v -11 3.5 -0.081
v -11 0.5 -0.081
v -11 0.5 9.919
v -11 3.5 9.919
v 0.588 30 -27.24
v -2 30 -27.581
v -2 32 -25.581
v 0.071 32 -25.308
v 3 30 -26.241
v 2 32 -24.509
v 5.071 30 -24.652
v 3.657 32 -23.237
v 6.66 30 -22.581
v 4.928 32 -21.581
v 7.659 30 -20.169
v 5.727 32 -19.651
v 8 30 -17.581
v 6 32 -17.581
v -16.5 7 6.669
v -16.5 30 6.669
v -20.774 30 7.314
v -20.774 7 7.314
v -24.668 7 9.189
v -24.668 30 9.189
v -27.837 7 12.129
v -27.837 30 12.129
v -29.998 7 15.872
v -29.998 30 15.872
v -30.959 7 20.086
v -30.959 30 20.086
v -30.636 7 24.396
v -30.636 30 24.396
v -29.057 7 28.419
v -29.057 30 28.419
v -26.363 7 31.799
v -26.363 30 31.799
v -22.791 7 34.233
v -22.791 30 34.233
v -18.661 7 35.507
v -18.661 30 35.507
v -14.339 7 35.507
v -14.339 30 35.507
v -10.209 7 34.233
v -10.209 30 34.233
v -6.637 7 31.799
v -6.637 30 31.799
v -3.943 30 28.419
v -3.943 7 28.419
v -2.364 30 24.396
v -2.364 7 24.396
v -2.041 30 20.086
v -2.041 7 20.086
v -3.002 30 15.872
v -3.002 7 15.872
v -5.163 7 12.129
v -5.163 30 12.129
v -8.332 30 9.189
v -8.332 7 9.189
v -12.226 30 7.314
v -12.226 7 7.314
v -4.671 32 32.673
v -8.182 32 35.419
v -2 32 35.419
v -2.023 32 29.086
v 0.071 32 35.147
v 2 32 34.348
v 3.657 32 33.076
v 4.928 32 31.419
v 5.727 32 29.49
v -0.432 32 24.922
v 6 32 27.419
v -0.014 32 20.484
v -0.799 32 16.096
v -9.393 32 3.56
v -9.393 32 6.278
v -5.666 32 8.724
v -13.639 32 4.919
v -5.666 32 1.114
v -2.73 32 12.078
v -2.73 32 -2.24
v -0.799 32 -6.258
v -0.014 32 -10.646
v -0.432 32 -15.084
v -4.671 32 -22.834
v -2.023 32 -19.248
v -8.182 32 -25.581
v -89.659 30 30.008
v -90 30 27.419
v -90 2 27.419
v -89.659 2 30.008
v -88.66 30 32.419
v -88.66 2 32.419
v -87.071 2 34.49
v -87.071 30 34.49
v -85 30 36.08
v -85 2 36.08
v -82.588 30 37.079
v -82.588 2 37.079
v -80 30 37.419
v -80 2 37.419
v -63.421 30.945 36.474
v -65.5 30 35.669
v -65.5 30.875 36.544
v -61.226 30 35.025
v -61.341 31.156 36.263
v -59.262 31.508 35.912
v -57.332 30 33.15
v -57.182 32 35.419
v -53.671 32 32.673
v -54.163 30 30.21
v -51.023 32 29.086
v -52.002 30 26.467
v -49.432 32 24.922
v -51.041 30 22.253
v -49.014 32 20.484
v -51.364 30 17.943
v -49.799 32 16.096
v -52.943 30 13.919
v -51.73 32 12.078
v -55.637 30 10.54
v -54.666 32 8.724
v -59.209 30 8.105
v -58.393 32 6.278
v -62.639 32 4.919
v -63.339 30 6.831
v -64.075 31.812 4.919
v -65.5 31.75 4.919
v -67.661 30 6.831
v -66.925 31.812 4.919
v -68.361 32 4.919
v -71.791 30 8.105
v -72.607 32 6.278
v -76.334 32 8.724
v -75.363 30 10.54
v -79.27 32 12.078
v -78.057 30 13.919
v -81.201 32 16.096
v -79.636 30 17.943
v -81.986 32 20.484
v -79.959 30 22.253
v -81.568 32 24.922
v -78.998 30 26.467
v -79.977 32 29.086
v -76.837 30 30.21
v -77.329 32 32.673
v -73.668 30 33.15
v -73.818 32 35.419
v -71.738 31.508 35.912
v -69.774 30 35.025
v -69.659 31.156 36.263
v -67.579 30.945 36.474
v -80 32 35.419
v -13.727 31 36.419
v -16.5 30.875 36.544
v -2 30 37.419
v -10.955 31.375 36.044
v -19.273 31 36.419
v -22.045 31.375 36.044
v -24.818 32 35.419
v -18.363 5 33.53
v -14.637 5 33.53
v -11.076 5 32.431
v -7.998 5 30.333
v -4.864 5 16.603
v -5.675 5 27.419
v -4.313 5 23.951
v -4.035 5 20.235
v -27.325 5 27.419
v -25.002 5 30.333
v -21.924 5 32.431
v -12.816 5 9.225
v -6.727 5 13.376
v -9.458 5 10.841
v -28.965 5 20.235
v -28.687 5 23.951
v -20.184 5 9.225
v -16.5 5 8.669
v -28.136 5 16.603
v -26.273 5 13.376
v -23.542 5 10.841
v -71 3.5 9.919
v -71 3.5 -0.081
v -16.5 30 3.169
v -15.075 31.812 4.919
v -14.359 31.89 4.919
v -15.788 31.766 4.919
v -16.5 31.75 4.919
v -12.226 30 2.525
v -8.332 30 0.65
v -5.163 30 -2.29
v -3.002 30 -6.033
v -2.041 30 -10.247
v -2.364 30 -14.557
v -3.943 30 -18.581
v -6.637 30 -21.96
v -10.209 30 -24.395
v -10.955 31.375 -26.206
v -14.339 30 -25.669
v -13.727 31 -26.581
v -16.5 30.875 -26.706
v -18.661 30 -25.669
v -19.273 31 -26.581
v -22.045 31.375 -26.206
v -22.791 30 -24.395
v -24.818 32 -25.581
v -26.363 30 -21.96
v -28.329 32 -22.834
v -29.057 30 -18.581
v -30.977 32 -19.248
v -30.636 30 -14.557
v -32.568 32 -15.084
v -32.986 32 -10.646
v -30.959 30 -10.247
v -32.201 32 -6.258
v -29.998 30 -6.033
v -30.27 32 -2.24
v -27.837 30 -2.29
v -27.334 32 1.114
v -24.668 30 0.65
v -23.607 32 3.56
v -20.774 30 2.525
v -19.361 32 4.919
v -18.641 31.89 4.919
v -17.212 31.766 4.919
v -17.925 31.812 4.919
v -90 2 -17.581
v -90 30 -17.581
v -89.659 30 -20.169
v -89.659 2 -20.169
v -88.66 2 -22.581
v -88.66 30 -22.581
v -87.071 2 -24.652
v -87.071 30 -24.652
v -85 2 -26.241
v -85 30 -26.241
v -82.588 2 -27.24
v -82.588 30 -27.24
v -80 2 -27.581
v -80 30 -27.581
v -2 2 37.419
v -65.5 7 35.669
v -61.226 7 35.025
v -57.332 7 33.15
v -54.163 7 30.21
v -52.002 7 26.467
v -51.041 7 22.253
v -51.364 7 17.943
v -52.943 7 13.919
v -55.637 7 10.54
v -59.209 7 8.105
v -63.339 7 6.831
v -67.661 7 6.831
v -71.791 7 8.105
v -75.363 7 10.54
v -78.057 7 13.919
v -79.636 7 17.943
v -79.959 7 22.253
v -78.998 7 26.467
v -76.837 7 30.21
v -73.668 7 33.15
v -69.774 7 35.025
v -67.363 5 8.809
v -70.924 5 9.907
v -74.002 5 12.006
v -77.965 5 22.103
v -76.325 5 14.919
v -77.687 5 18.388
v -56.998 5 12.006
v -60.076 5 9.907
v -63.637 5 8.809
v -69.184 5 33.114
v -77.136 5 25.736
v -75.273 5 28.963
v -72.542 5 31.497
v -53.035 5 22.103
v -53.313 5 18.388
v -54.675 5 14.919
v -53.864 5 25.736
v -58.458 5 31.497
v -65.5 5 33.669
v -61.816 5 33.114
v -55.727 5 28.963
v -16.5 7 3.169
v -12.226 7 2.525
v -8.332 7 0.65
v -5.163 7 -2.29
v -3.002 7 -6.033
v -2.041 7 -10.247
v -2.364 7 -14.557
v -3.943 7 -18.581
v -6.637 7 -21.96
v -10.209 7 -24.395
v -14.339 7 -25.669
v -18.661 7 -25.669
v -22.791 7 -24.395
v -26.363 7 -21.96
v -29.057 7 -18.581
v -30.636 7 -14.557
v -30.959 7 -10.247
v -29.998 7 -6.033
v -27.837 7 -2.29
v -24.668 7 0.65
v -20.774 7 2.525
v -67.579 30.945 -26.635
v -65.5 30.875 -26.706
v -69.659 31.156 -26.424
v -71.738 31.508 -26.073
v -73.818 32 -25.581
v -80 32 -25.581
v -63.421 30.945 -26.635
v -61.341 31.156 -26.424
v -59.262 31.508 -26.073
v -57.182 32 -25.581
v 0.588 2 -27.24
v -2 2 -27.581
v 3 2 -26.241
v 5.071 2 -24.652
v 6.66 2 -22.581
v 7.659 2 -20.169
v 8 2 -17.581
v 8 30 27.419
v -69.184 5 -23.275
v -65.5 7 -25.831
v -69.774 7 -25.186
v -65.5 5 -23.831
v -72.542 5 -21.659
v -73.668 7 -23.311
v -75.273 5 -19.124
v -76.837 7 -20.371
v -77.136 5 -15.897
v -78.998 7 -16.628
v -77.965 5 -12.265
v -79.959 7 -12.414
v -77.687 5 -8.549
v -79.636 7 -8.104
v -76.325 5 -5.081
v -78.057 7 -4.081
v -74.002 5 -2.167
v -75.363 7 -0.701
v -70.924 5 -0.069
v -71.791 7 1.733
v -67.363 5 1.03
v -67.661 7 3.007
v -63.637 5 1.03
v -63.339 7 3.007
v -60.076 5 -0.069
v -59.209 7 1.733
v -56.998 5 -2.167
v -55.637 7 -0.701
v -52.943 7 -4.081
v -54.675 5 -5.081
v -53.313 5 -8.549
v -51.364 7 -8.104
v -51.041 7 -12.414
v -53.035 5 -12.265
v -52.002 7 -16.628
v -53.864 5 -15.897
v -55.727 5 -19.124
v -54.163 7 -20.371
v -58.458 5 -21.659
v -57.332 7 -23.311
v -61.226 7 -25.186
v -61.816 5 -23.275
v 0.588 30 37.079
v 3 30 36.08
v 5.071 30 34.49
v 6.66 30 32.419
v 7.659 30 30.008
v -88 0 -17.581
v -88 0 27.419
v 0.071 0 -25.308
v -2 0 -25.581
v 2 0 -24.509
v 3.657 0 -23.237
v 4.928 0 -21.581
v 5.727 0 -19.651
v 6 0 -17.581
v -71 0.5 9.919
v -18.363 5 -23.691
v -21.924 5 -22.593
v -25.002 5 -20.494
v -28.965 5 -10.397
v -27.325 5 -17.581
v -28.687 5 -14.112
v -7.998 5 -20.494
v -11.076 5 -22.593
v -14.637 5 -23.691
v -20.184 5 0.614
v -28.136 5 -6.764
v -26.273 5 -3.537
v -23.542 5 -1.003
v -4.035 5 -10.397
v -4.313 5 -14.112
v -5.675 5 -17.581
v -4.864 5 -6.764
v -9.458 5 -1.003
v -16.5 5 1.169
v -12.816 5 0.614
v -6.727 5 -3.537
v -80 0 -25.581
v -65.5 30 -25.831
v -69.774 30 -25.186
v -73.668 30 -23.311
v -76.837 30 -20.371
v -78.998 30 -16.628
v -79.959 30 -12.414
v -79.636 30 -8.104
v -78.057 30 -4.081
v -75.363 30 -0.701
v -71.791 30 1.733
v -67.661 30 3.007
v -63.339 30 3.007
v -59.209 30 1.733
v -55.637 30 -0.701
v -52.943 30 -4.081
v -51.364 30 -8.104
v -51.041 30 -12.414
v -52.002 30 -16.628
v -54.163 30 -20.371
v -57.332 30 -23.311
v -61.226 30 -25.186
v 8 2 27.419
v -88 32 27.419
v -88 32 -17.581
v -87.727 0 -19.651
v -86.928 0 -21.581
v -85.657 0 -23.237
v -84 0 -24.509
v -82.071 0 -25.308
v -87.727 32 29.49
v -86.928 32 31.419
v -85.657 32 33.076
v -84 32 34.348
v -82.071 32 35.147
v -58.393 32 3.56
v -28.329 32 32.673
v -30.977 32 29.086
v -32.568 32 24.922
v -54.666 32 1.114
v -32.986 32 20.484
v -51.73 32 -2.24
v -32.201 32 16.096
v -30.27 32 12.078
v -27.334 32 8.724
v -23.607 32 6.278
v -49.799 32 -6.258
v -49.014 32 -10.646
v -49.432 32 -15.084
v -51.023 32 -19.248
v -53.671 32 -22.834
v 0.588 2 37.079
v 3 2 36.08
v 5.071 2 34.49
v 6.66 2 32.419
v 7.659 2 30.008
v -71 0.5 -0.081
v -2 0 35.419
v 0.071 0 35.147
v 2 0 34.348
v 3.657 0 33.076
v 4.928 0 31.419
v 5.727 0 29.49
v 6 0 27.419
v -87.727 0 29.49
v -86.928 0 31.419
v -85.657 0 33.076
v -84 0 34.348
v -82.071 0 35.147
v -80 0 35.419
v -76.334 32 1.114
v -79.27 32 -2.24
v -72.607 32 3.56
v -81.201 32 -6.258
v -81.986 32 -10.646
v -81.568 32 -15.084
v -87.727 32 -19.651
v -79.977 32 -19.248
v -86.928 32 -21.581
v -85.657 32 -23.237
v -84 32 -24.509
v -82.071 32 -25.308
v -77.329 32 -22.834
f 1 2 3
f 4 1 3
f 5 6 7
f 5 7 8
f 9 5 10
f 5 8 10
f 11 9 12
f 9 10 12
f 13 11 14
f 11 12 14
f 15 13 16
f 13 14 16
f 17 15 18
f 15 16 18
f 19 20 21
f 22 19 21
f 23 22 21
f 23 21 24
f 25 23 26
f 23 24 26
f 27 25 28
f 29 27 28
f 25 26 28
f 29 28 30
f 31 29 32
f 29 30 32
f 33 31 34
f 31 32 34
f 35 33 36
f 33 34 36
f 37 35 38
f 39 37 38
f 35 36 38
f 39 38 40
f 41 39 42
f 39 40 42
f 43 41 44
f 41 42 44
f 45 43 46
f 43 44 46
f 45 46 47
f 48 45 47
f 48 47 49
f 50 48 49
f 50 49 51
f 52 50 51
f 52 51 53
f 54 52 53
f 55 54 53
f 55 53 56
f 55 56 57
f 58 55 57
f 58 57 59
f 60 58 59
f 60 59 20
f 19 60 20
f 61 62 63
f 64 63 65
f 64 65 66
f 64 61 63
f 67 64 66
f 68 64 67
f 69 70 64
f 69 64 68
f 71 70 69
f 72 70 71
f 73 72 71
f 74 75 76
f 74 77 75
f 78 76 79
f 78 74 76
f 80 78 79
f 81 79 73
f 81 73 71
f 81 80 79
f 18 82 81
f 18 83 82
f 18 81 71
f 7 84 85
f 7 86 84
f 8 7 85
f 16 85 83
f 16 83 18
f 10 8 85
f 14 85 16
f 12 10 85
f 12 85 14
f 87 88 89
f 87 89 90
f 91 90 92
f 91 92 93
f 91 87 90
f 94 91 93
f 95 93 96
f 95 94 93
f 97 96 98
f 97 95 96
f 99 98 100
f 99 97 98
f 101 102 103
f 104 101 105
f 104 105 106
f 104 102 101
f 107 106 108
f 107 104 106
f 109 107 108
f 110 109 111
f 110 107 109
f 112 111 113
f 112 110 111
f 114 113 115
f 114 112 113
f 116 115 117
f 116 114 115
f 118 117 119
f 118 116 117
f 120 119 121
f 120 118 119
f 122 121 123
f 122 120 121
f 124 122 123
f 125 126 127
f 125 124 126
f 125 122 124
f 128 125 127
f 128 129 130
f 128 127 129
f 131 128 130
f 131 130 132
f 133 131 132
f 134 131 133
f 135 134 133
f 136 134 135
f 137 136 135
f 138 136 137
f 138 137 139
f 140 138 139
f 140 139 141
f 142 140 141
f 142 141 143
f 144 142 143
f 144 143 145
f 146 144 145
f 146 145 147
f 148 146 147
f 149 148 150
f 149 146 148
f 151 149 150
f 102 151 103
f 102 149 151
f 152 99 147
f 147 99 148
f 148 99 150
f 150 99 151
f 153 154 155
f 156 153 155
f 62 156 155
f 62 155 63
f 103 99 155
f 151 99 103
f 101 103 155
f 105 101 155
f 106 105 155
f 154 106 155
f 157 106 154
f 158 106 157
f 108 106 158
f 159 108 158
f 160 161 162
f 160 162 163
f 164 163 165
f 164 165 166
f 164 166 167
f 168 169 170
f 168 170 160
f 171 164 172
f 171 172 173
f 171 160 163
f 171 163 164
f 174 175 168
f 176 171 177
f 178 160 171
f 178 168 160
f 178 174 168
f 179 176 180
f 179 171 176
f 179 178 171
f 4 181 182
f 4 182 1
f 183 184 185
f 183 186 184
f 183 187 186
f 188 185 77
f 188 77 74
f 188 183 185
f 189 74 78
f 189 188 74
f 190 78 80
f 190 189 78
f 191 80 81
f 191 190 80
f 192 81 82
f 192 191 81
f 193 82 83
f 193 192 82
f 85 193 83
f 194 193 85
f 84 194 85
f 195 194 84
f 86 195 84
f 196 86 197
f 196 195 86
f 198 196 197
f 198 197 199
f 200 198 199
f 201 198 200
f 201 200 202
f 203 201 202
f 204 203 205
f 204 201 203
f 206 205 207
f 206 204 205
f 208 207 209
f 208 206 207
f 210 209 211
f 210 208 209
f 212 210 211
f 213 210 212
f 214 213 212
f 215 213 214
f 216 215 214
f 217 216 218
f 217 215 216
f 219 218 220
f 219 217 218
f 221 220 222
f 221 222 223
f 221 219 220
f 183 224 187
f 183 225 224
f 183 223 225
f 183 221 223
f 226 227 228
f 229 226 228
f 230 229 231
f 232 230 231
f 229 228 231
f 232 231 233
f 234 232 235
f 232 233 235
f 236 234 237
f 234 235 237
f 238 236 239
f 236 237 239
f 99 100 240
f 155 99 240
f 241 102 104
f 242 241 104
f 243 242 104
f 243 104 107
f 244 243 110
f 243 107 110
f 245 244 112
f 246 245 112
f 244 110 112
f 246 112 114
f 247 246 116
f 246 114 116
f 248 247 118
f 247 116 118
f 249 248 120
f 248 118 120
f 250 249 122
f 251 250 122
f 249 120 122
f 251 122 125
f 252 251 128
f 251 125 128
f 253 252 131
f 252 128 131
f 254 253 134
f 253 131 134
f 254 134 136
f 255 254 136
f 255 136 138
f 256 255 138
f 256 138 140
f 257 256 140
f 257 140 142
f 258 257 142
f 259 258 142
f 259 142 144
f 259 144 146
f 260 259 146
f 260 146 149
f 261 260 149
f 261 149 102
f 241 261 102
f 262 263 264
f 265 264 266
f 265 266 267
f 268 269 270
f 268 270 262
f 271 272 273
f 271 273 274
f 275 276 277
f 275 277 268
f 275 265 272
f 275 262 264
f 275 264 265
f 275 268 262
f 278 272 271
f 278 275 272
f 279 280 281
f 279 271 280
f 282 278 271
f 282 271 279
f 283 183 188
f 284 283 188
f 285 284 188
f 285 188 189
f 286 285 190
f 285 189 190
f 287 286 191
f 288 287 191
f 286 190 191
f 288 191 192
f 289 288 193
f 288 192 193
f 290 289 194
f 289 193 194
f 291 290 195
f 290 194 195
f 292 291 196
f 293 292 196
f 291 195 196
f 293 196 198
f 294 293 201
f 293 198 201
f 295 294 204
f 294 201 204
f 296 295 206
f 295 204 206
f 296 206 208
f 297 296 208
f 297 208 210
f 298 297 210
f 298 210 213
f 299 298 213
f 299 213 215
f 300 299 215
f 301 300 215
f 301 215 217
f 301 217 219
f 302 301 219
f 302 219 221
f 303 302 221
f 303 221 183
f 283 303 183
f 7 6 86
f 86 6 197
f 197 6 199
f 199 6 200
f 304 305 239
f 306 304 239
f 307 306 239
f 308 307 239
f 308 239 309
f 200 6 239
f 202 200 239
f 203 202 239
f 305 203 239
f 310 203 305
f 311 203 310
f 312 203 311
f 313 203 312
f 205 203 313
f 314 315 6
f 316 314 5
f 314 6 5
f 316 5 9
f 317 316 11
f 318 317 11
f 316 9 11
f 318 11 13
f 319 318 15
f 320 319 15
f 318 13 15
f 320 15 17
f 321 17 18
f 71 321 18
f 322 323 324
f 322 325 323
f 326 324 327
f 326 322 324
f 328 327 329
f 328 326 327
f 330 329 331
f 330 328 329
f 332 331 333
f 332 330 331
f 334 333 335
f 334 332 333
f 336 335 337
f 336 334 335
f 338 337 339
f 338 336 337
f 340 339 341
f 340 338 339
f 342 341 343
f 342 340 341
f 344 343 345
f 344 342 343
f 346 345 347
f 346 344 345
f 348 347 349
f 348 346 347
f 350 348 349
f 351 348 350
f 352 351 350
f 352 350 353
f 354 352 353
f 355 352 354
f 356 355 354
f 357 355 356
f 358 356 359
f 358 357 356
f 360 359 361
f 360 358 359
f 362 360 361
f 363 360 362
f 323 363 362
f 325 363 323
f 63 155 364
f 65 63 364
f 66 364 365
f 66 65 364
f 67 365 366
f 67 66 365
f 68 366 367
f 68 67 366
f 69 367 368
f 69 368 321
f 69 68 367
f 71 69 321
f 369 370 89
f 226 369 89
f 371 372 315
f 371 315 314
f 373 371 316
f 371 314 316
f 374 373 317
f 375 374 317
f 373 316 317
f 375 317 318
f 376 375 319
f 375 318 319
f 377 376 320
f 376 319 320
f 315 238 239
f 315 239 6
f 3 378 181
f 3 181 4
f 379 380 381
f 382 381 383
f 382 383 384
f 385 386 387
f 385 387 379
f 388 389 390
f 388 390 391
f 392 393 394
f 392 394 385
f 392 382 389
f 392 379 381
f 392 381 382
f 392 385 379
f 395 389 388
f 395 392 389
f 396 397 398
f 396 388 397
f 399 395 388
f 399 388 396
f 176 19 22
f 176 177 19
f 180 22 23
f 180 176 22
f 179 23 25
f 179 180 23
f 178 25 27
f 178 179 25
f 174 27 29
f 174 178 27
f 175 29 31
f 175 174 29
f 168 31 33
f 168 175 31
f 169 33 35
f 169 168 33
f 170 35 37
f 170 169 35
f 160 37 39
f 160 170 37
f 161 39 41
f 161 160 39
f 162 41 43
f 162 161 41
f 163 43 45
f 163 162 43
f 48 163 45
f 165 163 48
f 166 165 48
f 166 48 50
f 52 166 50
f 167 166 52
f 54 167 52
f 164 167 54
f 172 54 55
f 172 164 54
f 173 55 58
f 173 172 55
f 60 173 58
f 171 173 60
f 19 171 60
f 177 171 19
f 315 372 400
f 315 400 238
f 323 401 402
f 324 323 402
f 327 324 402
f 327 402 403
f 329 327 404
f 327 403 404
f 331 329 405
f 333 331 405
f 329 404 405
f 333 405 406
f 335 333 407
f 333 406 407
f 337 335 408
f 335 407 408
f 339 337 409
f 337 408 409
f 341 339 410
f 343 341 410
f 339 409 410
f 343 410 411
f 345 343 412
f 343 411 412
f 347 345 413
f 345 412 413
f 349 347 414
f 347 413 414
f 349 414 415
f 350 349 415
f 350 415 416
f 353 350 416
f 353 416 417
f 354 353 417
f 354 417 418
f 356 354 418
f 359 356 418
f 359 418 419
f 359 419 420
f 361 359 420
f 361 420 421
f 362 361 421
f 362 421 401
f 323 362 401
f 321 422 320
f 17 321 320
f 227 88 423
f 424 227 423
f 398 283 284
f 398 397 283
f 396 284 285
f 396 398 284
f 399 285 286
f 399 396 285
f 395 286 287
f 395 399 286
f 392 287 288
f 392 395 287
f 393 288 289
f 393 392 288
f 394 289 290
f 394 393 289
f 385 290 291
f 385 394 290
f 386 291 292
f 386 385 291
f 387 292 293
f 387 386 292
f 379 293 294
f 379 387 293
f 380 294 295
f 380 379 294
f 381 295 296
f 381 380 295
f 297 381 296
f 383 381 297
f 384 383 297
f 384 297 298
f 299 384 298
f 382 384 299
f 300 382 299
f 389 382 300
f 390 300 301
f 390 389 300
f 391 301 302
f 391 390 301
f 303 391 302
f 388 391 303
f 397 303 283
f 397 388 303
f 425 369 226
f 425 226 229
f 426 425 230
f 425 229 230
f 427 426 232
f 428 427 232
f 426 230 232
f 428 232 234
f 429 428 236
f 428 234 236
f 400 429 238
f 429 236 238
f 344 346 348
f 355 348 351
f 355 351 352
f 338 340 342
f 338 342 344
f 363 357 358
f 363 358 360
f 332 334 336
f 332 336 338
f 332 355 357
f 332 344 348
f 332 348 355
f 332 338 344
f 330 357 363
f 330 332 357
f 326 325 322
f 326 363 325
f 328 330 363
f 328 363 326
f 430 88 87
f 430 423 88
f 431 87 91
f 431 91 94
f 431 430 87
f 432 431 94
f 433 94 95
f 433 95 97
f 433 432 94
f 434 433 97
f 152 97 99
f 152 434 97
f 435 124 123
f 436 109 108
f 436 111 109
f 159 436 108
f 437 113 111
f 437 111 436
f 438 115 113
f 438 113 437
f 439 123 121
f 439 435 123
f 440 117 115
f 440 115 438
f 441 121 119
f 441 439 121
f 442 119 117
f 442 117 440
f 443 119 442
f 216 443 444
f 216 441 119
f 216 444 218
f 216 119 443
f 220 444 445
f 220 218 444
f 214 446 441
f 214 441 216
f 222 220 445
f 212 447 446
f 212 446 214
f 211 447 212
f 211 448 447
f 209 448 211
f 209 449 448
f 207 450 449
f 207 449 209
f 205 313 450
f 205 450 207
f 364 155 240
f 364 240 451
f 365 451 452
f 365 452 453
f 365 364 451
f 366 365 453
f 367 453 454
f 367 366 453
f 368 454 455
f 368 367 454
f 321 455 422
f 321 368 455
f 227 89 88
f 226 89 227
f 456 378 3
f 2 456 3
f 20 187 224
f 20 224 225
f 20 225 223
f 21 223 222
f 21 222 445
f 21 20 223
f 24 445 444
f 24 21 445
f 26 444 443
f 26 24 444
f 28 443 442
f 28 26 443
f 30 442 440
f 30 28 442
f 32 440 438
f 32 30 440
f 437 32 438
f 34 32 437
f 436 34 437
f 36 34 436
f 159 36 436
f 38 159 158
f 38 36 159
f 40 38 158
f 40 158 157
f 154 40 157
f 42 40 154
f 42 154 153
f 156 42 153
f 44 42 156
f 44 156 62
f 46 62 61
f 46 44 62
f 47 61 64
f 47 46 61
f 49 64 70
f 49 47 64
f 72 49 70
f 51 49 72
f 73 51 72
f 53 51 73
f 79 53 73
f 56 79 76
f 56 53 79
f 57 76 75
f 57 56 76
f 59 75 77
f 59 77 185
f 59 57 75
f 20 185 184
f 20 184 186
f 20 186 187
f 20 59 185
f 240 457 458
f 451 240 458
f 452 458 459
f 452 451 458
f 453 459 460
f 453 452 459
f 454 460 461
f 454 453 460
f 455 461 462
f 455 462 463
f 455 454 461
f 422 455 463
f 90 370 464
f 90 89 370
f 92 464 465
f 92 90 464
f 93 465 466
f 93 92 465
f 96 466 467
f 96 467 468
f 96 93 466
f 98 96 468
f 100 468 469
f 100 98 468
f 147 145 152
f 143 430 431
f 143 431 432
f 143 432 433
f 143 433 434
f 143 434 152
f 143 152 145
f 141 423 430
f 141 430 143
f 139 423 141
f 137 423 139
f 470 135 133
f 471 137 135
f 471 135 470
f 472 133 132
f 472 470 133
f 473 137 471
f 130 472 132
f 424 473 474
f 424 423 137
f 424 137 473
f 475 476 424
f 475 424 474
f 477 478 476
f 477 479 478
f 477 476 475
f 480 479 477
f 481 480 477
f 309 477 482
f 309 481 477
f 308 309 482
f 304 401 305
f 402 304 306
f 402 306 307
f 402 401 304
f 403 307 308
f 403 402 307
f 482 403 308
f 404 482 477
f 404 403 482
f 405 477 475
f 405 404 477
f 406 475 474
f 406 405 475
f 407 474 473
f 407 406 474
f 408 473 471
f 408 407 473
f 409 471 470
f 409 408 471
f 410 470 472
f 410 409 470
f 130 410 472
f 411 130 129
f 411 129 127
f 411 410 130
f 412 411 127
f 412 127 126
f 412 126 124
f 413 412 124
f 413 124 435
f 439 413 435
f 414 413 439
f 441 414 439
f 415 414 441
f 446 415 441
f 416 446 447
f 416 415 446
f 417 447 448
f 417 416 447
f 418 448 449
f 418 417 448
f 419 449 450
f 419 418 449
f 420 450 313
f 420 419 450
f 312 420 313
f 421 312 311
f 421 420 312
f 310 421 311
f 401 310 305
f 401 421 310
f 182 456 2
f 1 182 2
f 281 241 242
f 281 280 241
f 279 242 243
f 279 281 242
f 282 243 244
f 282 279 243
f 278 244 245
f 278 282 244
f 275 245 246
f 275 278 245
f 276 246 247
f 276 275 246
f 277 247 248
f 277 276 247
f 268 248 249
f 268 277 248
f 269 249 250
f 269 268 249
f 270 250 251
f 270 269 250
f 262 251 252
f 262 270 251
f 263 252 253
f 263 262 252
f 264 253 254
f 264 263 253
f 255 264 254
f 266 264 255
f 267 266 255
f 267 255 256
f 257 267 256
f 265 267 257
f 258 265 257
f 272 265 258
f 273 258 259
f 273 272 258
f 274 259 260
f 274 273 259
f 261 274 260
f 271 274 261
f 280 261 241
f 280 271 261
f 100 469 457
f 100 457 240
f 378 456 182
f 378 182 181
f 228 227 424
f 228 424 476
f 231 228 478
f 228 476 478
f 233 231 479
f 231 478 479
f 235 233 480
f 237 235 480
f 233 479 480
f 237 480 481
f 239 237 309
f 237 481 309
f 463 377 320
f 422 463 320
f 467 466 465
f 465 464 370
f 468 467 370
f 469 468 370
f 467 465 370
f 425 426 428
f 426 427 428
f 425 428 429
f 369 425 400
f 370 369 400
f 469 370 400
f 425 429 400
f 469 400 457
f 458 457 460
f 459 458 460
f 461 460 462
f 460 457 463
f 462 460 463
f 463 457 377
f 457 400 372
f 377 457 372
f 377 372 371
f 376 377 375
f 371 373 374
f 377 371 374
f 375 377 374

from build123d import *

# Parameters (mm, degrees)
SKETCH1_W           = 98
SKETCH1_H           = 65
BOSS_EXTRUDE1_DEPTH = 32
SKETCH2_R           = 14.5
CUT_EXTRUDE1_DEPTH  = 27
FILLET1_R           = 10
FILLET2_R           = 10
FILLET3_R           = 10
FILLET4_R           = 10
CHAMFER1_SIZE       = 2
CUT_EXTRUDE2_START  = -0.5
SKETCH3_W           = 60
SKETCH3_H           = 10
CUT_EXTRUDE2_DEPTH  = 3


with BuildPart() as part:
    # Sketch1 → Boss-Extrude1 (new body)
    with BuildSketch(Plane(origin=(0, 0, 0), x_dir=(1, 0, 0), z_dir=(0, 1, 0))):
        with Locations((-41, -4.919354839)):
            Rectangle(SKETCH1_W, SKETCH1_H)
    extrude(amount=BOSS_EXTRUDE1_DEPTH)

    # Sketch2 → Cut-Extrude1 (cut)
    with BuildSketch(Plane(origin=(0, 32, 0), x_dir=(1, 0, 0), z_dir=(0, 1, 0))):
        with Locations(Location((-16.5, 11.330645161, 0), (0, 0, 270))):
            Circle(SKETCH2_R)
        with Locations(Location((-16.5, -21.169354839, 0), (0, 0, 90))):
            Circle(SKETCH2_R)
        with Locations(Location((-65.5, 11.330645161, 0), (0, 0, 90))):
            Circle(SKETCH2_R)
        with Locations(Location((-65.5, -21.169354839, 0), (0, 0, 270))):
            Circle(SKETCH2_R)
    extrude(amount=-CUT_EXTRUDE1_DEPTH, mode=Mode.SUBTRACT)

    # Fillet1
    fillet1_edges = [part.edges().sort_by_distance(p)[0] for p in [
        (8, 16, -27.580645161),
    ]]
    fillet(fillet1_edges, radius=FILLET1_R)

    # Fillet2
    fillet2_edges = [part.edges().sort_by_distance(p)[0] for p in [
        (-90, 16, 37.419354839),
    ]]
    fillet(fillet2_edges, radius=FILLET2_R)

    # Fillet3
    fillet3_edges = [part.edges().sort_by_distance(p)[0] for p in [
        (-90, 16, -27.580645161),
    ]]
    fillet(fillet3_edges, radius=FILLET3_R)

    # Fillet4
    fillet4_edges = [part.edges().sort_by_distance(p)[0] for p in [
        (8, 16, 37.419354839),
    ]]
    fillet(fillet4_edges, radius=FILLET4_R)

    # Chamfer1
    # the kernel refuses this chamfer: 2 mm, written as the material it adds along each edge
    with BuildSketch(Plane(origin=(-16.5, 5, 21.169354839), x_dir=(0, 0, -1), z_dir=(1, 0, 0))) as chamfer1_piece_1:
        Polygon((14.5, CHAMFER1_SIZE), (14.5 - CHAMFER1_SIZE, 0), (14.5, 0), align=None)
    revolve(axis=Axis((-16.5, 5, 21.169354839), (0, 1, 0)))
    with BuildSketch(Plane(origin=(-65.5, 5, -11.330645161), x_dir=(0, 0, -1), z_dir=(1, 0, 0))) as chamfer1_piece_2:
        Polygon((14.5, CHAMFER1_SIZE), (14.5 - CHAMFER1_SIZE, 0), (14.5, 0), align=None)
    revolve(axis=Axis((-65.5, 5, -11.330645161), (0, 1, 0)))
    with BuildSketch(Plane(origin=(-65.5, 5, 21.169354839), x_dir=(0, 0, 1), z_dir=(-1, 0, 0))) as chamfer1_piece_3:
        Polygon((14.5, CHAMFER1_SIZE), (14.5 - CHAMFER1_SIZE, 0), (14.5, 0), align=None)
    revolve(axis=Axis((-65.5, 5, 21.169354839), (0, 1, 0)))
    with BuildSketch(Plane(origin=(-16.5, 5, -11.330645161), x_dir=(0, 0, 1), z_dir=(-1, 0, 0))) as chamfer1_piece_4:
        Polygon((14.5, CHAMFER1_SIZE), (14.5 - CHAMFER1_SIZE, 0), (14.5, 0), align=None)
    revolve(axis=Axis((-16.5, 5, -11.330645161), (0, 1, 0)))
    # the kernel refuses this chamfer: 2 mm, written as the material it takes off along each edge
    with BuildSketch(Plane(origin=(-16.5, 32, 21.169354839), x_dir=(0, 0, -1), z_dir=(1, 0, 0))) as chamfer1_2_piece_1:
        Polygon((14.5 + CHAMFER1_SIZE, 0), (14.5, -CHAMFER1_SIZE), (14.5, 0), align=None)
    revolve(axis=Axis((-16.5, 32, 21.169354839), (0, 1, 0)), mode=Mode.SUBTRACT)
    with BuildSketch(Plane(origin=(-65.5, 32, -11.330645161), x_dir=(0, 0, -1), z_dir=(1, 0, 0))) as chamfer1_2_piece_2:
        Polygon((14.5 + CHAMFER1_SIZE, 0), (14.5, -CHAMFER1_SIZE), (14.5, 0), align=None)
    revolve(axis=Axis((-65.5, 32, -11.330645161), (0, 1, 0)), mode=Mode.SUBTRACT)
    with BuildSketch(Plane(origin=(-65.5, 32, 21.169354839), x_dir=(0, 0, 1), z_dir=(-1, 0, 0))) as chamfer1_2_piece_3:
        Polygon((14.5 + CHAMFER1_SIZE, 0), (14.5, -CHAMFER1_SIZE), (14.5, 0), align=None)
    revolve(axis=Axis((-65.5, 32, 21.169354839), (0, 1, 0)), mode=Mode.SUBTRACT)
    with BuildSketch(Plane(origin=(-16.5, 32, -11.330645161), x_dir=(0, 0, 1), z_dir=(-1, 0, 0))) as chamfer1_2_piece_4:
        Polygon((14.5 + CHAMFER1_SIZE, 0), (14.5, -CHAMFER1_SIZE), (14.5, 0), align=None)
    revolve(axis=Axis((-16.5, 32, -11.330645161), (0, 1, 0)), mode=Mode.SUBTRACT)
    with BuildSketch(Plane(origin=(-80, 0, -27.580645161), x_dir=(0, -0.02749587661058639, 0.9996219169112968), z_dir=(1, 0, 0)), Plane(origin=(-80, 32, -27.580645161), x_dir=(0, -0.9996219169112968, -0.027495876610585647), z_dir=(1, 0, 0)), Plane(origin=(-2, 0, 37.419354839), x_dir=(0, -0.02749587661058639, -0.9996219169112968), z_dir=(-1, 0, 0)), Plane(origin=(-2, 32, 37.419354839), x_dir=(0, -0.9996219169112968, 0.027495876610585647), z_dir=(-1, 0, 0))) as chamfer1_2_piece_5:
        Polygon((CHAMFER1_SIZE * 0.999621916911, -CHAMFER1_SIZE * 0.0274958766106), (-CHAMFER1_SIZE * 0.0274958766106, -CHAMFER1_SIZE * 0.999621916911), (0, 0), align=None)
    extrude(amount=78, mode=Mode.SUBTRACT)
    with BuildSketch(Plane(origin=(-2, 0, -17.580645161), x_dir=(0, 0, -1), z_dir=(-1, 0, 0))) as chamfer1_2_piece_6:
        Polygon((10 - CHAMFER1_SIZE, 0), (10, -CHAMFER1_SIZE), (10, 0), align=None)
    revolve(axis=Axis((-2, 0, -17.580645161), (0, -1, 0)), revolution_arc=90, mode=Mode.SUBTRACT)
    with BuildSketch(Plane(origin=(-2, 32, -17.580645161), x_dir=(0, 0, -1), z_dir=(-1, 0, 0))) as chamfer1_2_piece_7:
        Polygon((10, CHAMFER1_SIZE), (10 - CHAMFER1_SIZE, 0), (10, 0), align=None)
    revolve(axis=Axis((-2, 32, -17.580645161), (0, -1, 0)), revolution_arc=90, mode=Mode.SUBTRACT)
    with BuildSketch(Plane(origin=(-80, 32, 27.419354839), x_dir=(-1, 0, 0), z_dir=(0, 0, -1))) as chamfer1_2_piece_8:
        Polygon((10, -CHAMFER1_SIZE), (10 - CHAMFER1_SIZE, 0), (10, 0), align=None)
    revolve(axis=Axis((-80, 32, 27.419354839), (0, 1, 0)), revolution_arc=90, mode=Mode.SUBTRACT)
    with BuildSketch(Plane(origin=(-80, 0, 27.419354839), x_dir=(-1, 0, 0), z_dir=(0, 0, -1))) as chamfer1_2_piece_9:
        Polygon((10 - CHAMFER1_SIZE, 0), (10, CHAMFER1_SIZE), (10, 0), align=None)
    revolve(axis=Axis((-80, 0, 27.419354839), (0, 1, 0)), revolution_arc=90, mode=Mode.SUBTRACT)
    with BuildSketch(Plane(origin=(-90, 0, 27.419354839), x_dir=(0.9996219169112968, -0.027495876610586292, 0), z_dir=(0, 0, -1)), Plane(origin=(-90, 32, 27.419354839), x_dir=(-0.0274958766105891, -0.9996219169112968, 0), z_dir=(0, 0, -1)), Plane(origin=(8, 0, -17.580645161), x_dir=(-0.9996219169112968, -0.027495876610586438, 0), z_dir=(0, 0, 1)), Plane(origin=(8, 32, -17.580645161), x_dir=(0.02749587661058651, -0.9996219169112968, 0), z_dir=(0, 0, 1))) as chamfer1_2_piece_10:
        Polygon((CHAMFER1_SIZE * 0.999621916911, -CHAMFER1_SIZE * 0.0274958766106), (-CHAMFER1_SIZE * 0.0274958766106, -CHAMFER1_SIZE * 0.999621916911), (0, 0), align=None)
    extrude(amount=45, mode=Mode.SUBTRACT)
    with BuildSketch(Plane(origin=(-80, 0, -17.580645161), x_dir=(-1, 0, 0), z_dir=(0, 0, 1))) as chamfer1_2_piece_11:
        Polygon((10 - CHAMFER1_SIZE, 0), (10, -CHAMFER1_SIZE), (10, 0), align=None)
    revolve(axis=Axis((-80, 0, -17.580645161), (0, -1, 0)), revolution_arc=90, mode=Mode.SUBTRACT)
    with BuildSketch(Plane(origin=(-80, 32, -17.580645161), x_dir=(-1, 0, 0), z_dir=(0, 0, 1))) as chamfer1_2_piece_12:
        Polygon((10, CHAMFER1_SIZE), (10 - CHAMFER1_SIZE, 0), (10, 0), align=None)
    revolve(axis=Axis((-80, 32, -17.580645161), (0, -1, 0)), revolution_arc=90, mode=Mode.SUBTRACT)
    with BuildSketch(Plane(origin=(-2, 32, 27.419354839), x_dir=(0, 0, 1), z_dir=(-1, 0, 0))) as chamfer1_2_piece_13:
        Polygon((10, -CHAMFER1_SIZE), (10 - CHAMFER1_SIZE, 0), (10, 0), align=None)
    revolve(axis=Axis((-2, 32, 27.419354839), (0, 1, 0)), revolution_arc=90, mode=Mode.SUBTRACT)
    with BuildSketch(Plane(origin=(-2, 0, 27.419354839), x_dir=(0, 0, 1), z_dir=(-1, 0, 0))) as chamfer1_2_piece_14:
        Polygon((10 - CHAMFER1_SIZE, 0), (10, CHAMFER1_SIZE), (10, 0), align=None)
    revolve(axis=Axis((-2, 0, 27.419354839), (0, 1, 0)), revolution_arc=90, mode=Mode.SUBTRACT)

    # Sketch3 → Cut-Extrude2 (cut)
    with BuildSketch(Plane.XZ.offset(CUT_EXTRUDE2_START)):
        with Locations((-41, 4.919354839)):
            Rectangle(SKETCH3_W, SKETCH3_H)
    extrude(amount=-CUT_EXTRUDE2_DEPTH, mode=Mode.SUBTRACT)


solid = part.part
